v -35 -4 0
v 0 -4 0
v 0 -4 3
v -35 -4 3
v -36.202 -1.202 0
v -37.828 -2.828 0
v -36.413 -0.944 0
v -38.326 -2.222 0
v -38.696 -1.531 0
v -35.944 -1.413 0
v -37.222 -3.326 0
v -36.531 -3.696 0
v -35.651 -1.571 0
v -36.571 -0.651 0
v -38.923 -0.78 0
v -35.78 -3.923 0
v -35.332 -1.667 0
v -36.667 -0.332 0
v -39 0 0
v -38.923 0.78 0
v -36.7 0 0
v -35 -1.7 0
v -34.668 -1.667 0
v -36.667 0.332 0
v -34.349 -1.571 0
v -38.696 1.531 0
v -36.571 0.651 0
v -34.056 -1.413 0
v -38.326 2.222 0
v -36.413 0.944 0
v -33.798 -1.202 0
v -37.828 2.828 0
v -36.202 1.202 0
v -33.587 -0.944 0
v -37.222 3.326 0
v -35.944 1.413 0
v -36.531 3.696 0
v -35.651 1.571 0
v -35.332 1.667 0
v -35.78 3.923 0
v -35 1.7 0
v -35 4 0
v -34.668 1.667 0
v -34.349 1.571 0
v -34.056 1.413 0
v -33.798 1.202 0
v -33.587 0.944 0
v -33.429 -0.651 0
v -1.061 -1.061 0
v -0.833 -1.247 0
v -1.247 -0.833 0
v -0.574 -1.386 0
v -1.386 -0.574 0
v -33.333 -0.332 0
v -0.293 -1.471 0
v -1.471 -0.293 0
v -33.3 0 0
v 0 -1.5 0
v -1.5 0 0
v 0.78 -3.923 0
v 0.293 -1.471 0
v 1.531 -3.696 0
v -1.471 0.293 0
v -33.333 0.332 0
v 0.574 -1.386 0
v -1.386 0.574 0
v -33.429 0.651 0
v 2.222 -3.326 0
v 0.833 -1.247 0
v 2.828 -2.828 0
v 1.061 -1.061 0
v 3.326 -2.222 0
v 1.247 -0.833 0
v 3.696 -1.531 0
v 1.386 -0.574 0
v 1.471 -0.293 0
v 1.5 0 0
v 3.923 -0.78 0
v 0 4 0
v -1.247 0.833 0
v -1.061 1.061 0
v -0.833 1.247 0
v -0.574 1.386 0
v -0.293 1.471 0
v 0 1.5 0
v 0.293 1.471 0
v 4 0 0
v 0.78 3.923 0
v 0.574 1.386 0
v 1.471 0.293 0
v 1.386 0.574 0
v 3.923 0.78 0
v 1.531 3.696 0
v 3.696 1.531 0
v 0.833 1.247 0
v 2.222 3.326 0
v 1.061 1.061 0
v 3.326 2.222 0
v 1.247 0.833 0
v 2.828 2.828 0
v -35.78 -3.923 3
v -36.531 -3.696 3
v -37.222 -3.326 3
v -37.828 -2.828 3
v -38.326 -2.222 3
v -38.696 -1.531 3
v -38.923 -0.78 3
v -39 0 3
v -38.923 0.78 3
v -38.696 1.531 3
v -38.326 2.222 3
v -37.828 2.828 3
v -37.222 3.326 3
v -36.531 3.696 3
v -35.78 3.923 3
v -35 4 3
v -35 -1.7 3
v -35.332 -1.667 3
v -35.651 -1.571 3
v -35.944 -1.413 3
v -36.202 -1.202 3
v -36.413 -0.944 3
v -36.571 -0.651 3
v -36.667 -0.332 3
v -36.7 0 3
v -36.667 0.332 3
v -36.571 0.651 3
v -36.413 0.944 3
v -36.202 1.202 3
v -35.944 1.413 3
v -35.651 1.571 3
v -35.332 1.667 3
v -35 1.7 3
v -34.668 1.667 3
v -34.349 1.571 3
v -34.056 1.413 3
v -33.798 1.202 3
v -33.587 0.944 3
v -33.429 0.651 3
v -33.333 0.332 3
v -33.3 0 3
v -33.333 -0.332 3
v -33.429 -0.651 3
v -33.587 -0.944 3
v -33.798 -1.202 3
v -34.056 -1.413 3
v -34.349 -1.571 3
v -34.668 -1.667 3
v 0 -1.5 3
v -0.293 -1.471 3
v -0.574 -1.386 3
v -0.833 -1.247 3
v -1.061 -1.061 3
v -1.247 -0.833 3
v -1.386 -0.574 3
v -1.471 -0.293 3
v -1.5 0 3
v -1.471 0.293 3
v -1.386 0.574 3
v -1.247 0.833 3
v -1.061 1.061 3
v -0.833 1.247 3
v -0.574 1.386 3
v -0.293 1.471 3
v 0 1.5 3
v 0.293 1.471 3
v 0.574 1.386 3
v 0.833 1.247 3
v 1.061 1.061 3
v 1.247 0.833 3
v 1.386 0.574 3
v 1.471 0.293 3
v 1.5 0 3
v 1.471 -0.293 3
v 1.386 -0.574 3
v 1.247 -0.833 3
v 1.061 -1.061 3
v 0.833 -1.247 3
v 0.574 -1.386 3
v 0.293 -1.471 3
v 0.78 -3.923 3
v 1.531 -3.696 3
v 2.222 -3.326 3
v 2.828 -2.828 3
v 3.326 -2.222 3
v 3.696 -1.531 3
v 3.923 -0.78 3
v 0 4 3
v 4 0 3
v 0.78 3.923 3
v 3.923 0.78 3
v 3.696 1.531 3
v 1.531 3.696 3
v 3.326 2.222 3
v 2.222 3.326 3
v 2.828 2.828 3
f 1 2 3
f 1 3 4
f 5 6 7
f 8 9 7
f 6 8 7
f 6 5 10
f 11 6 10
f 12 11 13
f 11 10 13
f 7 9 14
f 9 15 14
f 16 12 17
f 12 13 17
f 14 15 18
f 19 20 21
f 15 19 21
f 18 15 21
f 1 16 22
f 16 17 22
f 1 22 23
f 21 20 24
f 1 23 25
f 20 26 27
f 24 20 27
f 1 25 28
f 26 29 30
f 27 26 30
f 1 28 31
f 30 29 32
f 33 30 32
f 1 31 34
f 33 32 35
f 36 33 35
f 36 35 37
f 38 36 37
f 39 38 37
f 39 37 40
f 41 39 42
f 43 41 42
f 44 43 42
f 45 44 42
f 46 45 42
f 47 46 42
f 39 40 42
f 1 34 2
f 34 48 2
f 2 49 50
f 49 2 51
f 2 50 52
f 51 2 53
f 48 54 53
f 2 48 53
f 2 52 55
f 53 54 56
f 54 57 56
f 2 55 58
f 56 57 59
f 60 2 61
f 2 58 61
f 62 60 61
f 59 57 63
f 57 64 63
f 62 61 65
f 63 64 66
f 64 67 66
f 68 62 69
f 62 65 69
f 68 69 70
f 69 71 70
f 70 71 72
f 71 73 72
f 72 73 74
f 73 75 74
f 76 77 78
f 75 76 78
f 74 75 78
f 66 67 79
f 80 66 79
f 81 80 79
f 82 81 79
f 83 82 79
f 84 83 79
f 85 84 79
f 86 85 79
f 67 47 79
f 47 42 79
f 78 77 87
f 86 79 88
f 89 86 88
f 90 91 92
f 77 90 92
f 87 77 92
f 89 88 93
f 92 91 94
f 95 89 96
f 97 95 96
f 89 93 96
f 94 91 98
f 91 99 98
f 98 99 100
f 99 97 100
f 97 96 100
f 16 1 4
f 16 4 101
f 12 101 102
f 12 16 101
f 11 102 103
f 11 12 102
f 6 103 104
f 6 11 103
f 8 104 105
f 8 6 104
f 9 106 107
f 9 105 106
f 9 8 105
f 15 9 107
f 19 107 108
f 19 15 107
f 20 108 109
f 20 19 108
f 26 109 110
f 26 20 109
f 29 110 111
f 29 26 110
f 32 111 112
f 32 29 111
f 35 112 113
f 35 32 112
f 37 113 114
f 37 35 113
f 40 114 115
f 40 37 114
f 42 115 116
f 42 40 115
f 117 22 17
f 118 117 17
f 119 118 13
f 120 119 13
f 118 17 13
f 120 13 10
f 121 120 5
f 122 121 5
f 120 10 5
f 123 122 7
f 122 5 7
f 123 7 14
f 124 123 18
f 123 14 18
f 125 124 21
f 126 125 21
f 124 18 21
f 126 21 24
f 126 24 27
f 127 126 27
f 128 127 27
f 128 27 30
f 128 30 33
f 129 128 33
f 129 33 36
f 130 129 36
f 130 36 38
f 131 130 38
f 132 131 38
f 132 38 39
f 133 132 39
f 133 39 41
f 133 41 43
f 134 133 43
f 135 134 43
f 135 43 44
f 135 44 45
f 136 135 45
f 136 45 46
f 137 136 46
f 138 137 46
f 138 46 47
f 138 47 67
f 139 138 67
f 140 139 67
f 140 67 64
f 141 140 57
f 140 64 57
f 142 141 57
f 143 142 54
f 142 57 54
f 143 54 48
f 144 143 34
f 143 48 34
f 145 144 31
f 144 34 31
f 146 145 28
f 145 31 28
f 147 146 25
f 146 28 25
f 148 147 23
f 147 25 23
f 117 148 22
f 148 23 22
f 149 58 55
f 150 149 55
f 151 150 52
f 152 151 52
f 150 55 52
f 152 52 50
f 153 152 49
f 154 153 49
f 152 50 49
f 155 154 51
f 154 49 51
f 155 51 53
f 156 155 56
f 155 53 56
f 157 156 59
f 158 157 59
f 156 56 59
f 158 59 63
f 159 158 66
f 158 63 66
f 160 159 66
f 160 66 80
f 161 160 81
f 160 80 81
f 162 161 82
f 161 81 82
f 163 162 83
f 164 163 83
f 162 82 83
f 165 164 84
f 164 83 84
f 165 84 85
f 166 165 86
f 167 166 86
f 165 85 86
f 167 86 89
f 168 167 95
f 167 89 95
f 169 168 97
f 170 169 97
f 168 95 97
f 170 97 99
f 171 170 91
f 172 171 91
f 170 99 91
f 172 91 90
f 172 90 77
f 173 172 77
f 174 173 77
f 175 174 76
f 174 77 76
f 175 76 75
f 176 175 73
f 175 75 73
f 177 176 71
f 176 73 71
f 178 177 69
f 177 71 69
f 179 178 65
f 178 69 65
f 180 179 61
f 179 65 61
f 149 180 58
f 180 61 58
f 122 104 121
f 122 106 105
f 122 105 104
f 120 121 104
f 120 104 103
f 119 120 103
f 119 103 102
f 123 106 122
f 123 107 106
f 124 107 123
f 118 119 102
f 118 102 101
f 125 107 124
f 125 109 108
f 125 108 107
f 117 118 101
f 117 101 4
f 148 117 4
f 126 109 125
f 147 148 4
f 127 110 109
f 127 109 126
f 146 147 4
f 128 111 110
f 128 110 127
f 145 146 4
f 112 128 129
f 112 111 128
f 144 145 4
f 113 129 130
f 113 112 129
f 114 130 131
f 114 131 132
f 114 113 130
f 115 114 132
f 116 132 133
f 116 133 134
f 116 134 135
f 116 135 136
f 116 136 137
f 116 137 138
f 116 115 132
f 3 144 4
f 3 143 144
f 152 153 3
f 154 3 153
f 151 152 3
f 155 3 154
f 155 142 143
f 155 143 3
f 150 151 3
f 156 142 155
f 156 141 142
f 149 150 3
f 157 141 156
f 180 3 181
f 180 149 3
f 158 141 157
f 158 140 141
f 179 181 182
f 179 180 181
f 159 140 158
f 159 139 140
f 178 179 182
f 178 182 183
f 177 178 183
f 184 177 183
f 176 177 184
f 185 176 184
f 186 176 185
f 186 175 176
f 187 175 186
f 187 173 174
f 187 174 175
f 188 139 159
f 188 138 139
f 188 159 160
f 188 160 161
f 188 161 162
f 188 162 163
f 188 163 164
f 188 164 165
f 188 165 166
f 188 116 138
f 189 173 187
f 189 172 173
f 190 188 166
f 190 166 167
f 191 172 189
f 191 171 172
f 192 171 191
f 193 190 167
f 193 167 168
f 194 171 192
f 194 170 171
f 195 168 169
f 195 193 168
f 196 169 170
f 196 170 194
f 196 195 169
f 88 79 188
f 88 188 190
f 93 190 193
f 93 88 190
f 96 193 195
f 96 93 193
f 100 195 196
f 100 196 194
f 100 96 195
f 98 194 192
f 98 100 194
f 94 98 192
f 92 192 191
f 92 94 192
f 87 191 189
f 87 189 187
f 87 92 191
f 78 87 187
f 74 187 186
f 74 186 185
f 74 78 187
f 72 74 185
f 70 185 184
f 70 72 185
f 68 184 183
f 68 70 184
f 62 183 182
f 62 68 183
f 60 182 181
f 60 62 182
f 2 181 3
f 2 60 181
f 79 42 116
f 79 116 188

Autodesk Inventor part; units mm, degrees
ref_plane "YZ Plane" through (0, 0, 0) normal (1, 0, 0) x (0, 1, 0)
ref_plane "XZ Plane" through (0, 0, 0) normal (0, 1, 0) x (-1, 0, 0)
ref_plane "XY Plane" through (0, 0, 0) normal (0, 0, 1) x (1, 0, 0)
sketch "Sketch1" plane through (0, 0, 0) normal (0, 0, 1) x (1, 0, 0)
  circle A0 centre (0, 0) radius 4
  circle A1 centre (-35, 0) radius 4
  line L0 (-35, 4) -> (0, 4)
  line L1 (0, -4) -> (-35, -4)
  dimension "d0" = 8
  dimension "d1" = 8
  dimension "d2" = 35
extrude "Extrusion1" add sketch "Sketch1" along normal blind 3
sketch "Sketch3" plane through (0, 0, 3) normal (0, 0, 1) x (1, 0, 0)
  arc A0 (-35, 4) -> (-35, -4) centre (-35, 0) ccw projected
  line L0 (-35, -4) -> (0, -4) projected
  arc A1 (0, -4) -> (0, 4) centre (0, 0) ccw projected
  line L1 (0, 4) -> (-35, 4) projected
hole "Hole1" at (0, 0, 3) direction (0, 0, -1) diameter 3 end through all
sketch "Sketch4" plane through (0, 0, 3) normal (0, 0, 1) x (1, 0, 0)
  circle A0 centre (0, 0) radius 1.5 projected
  arc A1 (-35, 4) -> (-35, -4) centre (-35, 0) ccw projected
  line L0 (-35, -4) -> (0, -4) projected
  arc A2 (0, -4) -> (0, 4) centre (0, 0) ccw projected
  line L1 (0, 4) -> (-35, 4) projected
hole "Hole2" at (-35, 0, 3) direction (0, 0, -1) diameter 3.4 end through all clearance for "Socket Head Cap Screw" size "M3" standard "Ansi Metric M Profile"
properties part number "Selection_Counterweight" material "Nylon 6/6"
